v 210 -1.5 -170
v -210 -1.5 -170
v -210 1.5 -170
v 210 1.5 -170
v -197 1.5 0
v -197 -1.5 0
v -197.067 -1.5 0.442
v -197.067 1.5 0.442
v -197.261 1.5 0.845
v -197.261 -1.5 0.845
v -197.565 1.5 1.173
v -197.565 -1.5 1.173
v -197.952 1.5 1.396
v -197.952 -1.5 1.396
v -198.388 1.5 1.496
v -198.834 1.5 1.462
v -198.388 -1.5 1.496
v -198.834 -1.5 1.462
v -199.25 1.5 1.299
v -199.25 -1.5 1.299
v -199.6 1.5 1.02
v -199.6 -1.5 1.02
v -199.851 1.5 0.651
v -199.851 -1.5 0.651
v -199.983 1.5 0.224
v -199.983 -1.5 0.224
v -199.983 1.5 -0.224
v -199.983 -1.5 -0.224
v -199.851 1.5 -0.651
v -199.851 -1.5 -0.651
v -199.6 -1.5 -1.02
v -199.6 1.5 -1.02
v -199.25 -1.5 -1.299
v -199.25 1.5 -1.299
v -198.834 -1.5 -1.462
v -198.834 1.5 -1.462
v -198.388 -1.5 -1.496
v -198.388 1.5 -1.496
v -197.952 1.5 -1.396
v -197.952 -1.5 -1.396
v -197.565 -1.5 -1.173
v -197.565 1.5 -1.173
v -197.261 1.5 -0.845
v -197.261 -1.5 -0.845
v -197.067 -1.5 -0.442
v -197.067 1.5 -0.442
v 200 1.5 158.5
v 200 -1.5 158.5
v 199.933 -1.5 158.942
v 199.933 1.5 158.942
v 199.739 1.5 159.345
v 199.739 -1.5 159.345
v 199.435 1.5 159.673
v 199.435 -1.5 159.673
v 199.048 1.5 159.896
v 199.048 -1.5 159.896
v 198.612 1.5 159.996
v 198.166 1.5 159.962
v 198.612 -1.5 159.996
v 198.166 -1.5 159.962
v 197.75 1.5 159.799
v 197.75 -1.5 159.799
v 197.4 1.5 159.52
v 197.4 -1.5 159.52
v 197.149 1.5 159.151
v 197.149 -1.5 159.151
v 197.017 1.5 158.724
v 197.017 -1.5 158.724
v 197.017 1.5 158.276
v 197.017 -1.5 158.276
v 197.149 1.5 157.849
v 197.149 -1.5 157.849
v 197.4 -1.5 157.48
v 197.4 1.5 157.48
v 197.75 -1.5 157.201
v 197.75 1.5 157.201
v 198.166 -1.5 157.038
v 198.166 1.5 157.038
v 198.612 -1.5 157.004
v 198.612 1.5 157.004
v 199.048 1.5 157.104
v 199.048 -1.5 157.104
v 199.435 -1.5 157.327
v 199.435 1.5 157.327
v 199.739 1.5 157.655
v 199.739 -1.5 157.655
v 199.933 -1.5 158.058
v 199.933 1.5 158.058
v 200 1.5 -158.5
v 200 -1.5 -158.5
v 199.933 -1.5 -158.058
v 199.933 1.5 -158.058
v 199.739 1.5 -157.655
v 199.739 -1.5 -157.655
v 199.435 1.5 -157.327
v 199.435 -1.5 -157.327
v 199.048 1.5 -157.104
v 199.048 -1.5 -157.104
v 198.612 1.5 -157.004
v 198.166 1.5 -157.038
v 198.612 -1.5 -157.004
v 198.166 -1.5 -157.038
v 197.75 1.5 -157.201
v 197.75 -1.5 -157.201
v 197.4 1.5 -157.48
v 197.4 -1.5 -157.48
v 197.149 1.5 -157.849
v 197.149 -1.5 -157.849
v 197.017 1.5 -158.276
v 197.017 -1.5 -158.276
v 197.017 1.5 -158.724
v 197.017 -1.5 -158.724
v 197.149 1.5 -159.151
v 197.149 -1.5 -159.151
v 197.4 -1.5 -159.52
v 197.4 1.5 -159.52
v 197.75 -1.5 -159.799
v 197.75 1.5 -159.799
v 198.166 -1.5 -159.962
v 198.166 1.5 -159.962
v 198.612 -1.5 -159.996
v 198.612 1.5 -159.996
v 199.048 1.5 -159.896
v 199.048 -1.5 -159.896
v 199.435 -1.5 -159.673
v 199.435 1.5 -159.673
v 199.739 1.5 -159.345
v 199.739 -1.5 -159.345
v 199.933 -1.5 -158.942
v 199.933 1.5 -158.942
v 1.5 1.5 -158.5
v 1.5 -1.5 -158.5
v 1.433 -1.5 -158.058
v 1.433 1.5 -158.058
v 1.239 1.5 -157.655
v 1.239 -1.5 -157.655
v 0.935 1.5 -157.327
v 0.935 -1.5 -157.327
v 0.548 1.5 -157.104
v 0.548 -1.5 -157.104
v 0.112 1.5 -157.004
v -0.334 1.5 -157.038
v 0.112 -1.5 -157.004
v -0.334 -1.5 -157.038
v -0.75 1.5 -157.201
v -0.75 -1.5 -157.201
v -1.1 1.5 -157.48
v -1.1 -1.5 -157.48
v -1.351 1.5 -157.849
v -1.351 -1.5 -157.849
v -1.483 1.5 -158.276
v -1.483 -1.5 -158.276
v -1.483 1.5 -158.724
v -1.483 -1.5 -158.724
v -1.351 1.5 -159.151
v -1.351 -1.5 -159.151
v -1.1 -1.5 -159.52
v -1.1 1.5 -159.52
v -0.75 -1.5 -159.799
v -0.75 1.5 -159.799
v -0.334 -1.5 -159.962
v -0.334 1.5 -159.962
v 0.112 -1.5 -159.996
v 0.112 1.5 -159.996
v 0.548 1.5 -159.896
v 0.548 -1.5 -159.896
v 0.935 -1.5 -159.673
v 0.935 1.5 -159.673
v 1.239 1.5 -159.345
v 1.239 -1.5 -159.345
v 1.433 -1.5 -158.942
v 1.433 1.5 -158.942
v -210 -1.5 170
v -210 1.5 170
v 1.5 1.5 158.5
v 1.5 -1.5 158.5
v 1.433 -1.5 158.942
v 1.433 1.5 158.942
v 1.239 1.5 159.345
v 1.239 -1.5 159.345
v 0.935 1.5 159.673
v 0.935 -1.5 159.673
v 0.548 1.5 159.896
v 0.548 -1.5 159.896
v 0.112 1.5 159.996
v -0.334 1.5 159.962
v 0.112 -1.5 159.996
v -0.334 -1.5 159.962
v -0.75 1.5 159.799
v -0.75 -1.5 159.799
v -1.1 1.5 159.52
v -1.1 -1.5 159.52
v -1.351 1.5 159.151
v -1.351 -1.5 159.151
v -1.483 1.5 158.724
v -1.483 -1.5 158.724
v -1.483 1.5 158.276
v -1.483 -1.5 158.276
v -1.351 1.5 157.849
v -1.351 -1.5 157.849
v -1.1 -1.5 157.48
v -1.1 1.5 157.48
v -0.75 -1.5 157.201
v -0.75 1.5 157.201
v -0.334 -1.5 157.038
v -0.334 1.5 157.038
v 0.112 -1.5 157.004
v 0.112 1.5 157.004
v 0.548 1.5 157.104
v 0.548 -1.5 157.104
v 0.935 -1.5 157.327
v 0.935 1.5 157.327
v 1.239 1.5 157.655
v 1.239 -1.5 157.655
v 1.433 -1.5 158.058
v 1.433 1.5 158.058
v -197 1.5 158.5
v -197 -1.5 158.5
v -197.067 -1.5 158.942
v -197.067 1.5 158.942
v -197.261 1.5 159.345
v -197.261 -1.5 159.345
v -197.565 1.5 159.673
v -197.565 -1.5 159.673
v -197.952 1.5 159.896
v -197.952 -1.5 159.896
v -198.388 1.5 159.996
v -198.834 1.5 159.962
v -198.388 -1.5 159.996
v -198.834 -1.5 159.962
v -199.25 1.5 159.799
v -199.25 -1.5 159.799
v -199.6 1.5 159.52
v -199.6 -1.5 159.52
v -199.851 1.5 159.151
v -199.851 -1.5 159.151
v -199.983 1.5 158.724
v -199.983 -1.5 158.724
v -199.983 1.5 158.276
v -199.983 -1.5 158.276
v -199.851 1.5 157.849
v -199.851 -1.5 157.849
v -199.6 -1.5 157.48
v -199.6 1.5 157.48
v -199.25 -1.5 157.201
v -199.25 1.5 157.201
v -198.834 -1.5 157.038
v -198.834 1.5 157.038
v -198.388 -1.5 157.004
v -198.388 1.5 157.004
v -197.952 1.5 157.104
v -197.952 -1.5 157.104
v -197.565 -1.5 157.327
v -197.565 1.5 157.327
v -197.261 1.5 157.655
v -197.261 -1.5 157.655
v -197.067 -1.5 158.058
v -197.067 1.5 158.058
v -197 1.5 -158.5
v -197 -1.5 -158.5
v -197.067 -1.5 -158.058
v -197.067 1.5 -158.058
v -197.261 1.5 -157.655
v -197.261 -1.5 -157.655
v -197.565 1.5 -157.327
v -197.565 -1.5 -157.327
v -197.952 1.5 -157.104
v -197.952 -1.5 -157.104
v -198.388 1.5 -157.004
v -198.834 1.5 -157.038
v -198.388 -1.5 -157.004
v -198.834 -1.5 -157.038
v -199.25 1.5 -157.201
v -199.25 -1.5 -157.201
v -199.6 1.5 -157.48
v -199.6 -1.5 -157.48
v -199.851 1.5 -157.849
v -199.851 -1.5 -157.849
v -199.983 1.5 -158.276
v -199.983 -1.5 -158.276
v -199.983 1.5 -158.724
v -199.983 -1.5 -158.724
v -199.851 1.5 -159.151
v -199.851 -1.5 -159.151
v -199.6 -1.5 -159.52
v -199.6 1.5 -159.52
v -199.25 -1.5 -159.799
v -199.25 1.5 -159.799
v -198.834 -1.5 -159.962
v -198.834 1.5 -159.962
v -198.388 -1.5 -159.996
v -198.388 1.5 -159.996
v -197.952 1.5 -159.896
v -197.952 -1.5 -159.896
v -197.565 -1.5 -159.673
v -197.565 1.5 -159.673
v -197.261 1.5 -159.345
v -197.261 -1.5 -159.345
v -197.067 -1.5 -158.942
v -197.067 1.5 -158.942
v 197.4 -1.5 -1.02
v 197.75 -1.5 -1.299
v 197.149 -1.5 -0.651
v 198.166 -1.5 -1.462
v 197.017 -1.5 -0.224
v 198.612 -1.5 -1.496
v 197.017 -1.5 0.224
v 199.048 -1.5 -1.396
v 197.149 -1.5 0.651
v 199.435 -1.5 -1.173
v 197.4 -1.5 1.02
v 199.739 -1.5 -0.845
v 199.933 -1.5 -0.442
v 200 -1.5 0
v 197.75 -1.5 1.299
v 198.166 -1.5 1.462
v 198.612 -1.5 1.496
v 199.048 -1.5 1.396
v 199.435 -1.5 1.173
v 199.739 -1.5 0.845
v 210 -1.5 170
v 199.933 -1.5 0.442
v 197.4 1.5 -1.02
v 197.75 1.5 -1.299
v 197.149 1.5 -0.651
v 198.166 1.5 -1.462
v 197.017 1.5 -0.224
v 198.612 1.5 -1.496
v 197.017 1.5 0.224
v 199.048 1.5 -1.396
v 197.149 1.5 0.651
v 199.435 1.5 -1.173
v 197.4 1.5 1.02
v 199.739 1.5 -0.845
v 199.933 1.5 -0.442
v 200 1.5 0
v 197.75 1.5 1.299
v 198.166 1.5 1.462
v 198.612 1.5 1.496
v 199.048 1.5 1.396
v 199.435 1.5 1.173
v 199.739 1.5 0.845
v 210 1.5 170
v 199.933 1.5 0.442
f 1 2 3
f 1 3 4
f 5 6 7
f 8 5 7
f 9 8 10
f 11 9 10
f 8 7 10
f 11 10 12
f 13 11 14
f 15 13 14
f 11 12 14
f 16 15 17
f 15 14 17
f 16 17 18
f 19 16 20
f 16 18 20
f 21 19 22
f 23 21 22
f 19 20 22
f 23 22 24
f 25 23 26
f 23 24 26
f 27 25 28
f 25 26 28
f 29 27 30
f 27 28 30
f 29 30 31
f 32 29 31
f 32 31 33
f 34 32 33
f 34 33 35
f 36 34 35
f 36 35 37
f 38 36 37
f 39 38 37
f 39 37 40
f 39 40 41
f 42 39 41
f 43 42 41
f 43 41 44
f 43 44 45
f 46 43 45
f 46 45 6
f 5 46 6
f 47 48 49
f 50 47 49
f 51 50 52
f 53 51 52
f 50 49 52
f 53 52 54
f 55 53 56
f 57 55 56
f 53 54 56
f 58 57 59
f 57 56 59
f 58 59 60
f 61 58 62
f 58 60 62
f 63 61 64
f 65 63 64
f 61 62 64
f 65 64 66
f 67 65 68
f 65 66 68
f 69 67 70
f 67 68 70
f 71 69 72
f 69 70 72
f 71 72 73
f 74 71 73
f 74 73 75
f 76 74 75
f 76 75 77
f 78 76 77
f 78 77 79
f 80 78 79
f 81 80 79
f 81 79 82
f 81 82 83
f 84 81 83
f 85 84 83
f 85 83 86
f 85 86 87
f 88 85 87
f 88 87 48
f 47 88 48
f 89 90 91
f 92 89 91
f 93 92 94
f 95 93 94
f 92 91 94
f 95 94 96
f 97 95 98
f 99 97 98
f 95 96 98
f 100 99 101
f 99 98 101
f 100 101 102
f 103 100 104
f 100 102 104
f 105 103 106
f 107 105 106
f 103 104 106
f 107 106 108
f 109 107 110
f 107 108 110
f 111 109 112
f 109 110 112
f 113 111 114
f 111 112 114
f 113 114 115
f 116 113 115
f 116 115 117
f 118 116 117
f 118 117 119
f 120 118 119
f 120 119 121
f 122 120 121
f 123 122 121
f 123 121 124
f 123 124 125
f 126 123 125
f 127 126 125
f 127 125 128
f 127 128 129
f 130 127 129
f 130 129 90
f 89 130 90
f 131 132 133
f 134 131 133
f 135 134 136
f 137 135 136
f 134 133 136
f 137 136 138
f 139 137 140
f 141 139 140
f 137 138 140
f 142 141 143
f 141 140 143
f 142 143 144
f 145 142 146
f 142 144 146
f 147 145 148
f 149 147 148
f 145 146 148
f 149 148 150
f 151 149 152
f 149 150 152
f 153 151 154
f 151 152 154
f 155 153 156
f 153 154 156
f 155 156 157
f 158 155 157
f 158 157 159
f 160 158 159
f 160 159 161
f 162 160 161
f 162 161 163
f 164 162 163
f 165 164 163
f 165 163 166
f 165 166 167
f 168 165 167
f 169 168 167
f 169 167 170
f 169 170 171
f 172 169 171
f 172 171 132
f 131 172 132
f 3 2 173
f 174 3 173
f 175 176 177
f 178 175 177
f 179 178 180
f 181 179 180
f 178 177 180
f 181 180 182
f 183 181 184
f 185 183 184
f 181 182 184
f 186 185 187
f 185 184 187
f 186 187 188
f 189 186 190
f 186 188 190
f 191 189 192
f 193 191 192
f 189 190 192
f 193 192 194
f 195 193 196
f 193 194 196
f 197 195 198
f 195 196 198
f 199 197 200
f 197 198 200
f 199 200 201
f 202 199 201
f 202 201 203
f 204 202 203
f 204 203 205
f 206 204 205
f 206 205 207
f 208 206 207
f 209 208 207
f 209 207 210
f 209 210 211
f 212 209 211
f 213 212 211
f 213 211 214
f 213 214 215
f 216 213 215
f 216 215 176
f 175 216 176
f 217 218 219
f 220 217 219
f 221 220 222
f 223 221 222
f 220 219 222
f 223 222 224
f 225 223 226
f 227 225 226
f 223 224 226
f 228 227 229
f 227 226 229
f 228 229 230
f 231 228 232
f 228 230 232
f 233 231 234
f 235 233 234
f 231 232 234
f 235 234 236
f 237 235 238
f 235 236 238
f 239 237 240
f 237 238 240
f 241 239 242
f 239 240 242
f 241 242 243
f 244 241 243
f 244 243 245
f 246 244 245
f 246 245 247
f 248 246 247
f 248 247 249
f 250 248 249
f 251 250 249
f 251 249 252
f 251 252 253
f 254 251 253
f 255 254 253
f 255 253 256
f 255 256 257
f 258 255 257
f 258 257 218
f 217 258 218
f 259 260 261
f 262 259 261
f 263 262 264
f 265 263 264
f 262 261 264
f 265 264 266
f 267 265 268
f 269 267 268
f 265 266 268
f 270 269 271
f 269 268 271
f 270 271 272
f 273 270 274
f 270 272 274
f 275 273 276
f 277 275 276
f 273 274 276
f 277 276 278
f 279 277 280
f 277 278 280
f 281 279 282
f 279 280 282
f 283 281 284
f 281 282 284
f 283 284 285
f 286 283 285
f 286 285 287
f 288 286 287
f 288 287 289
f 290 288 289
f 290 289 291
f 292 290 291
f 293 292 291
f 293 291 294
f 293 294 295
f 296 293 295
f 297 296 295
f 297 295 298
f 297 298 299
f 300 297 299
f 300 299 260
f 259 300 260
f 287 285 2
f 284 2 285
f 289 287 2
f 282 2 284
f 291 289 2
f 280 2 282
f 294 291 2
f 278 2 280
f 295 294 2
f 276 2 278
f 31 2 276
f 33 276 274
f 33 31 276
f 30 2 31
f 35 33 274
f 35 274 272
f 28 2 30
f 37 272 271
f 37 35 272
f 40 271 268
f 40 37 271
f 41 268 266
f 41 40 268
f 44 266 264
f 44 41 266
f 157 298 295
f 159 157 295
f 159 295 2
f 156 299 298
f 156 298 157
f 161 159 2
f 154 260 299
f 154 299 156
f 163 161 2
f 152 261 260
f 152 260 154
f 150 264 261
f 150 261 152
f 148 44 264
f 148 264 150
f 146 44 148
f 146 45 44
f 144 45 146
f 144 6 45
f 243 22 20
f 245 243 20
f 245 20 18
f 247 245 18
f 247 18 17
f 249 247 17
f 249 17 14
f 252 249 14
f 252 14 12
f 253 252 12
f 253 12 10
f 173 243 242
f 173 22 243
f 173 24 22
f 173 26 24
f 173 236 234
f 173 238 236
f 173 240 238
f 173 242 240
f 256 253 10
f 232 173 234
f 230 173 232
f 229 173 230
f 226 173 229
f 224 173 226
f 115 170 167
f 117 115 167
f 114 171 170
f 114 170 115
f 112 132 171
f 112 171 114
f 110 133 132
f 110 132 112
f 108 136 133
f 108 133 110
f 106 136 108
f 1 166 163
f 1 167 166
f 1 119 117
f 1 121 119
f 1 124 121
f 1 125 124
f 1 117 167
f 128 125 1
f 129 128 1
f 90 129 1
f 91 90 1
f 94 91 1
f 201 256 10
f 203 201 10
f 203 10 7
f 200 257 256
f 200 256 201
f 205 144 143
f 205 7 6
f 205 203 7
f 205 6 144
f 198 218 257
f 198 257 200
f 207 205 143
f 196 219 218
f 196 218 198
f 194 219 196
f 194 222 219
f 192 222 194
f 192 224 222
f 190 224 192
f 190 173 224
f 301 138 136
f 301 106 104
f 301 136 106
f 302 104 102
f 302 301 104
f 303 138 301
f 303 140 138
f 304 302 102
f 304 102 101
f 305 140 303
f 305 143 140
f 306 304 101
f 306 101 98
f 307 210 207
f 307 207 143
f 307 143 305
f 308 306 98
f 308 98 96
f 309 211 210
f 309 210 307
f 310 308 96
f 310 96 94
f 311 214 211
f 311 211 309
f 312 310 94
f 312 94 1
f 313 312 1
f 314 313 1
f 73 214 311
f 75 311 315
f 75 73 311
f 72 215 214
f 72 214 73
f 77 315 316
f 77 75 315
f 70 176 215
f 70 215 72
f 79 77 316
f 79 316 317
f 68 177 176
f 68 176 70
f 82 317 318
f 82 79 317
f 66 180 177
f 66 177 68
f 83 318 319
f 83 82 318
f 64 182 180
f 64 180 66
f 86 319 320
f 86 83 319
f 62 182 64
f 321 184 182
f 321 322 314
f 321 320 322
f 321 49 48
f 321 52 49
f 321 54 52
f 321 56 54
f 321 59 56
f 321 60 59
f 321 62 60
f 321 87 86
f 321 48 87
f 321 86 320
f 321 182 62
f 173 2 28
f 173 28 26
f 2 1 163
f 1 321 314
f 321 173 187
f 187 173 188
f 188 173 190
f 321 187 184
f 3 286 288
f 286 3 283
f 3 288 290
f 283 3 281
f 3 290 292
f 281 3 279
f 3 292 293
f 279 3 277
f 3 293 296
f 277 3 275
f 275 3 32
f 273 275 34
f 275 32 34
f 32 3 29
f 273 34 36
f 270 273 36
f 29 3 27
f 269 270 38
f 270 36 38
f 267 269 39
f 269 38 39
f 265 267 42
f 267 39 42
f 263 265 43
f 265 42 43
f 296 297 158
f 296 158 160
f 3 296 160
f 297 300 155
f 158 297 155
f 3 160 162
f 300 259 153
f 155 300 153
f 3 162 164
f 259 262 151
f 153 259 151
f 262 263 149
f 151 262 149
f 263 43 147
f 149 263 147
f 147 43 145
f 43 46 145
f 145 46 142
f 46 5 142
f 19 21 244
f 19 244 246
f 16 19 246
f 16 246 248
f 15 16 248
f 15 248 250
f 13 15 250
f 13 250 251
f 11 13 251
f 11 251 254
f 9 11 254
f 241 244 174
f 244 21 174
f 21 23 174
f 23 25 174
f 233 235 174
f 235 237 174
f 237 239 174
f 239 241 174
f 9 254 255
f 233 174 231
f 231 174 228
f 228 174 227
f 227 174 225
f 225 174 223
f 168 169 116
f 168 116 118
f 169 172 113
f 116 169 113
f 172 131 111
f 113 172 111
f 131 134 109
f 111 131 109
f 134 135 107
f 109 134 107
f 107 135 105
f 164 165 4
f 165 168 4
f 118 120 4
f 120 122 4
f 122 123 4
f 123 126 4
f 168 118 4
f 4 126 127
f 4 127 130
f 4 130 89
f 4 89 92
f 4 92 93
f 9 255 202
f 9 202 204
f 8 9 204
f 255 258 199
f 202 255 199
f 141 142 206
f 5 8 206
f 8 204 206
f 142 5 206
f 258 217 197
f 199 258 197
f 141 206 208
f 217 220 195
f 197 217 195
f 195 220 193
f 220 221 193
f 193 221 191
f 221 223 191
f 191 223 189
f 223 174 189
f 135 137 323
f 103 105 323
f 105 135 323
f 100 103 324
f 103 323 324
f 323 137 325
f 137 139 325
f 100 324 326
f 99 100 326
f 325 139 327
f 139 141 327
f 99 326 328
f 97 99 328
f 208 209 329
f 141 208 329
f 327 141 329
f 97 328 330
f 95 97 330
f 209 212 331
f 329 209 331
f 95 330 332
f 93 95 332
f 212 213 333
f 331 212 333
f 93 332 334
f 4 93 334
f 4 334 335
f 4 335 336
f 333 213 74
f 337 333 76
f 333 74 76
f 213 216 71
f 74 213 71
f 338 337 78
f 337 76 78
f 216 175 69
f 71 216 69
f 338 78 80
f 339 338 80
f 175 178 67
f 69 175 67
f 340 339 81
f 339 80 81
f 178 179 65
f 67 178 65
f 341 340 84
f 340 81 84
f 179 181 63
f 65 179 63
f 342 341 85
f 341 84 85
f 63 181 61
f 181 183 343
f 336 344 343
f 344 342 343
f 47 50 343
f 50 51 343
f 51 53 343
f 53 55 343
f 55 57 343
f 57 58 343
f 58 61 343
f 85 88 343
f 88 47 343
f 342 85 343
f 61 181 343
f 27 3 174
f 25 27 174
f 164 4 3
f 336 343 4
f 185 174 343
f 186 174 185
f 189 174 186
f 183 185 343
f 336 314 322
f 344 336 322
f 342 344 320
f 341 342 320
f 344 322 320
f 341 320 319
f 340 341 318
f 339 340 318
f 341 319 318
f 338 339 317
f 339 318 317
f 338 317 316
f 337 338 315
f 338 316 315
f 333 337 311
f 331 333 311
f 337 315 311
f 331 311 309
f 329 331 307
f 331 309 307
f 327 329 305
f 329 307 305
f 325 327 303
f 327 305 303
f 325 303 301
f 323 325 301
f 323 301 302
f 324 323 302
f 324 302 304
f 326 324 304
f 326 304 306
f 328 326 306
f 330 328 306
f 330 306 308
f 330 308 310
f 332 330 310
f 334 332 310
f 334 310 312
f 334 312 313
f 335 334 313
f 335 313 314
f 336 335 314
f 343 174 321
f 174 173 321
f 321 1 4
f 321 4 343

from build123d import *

# Parameters (mm, degrees)
F0_W     = 420
F0_H     = 340
F1_DEPTH = 1.5
F2_R     = 1.5
F3_DEPTH = 25


with BuildPart() as f1:
    # F0 (on Front) → F1 (new body, symmetric)
    with BuildSketch(Plane.XZ):
        Rectangle(F0_W, F0_H)
    extrude(amount=F1_DEPTH, both=True)

    # F2 (on face) → F3 (cut)
    with BuildSketch(Plane.XZ.offset(1.5)):
        with Locations((-198.5, 158.5)):
            Circle(F2_R)
        with Locations((198.5, -158.5)):
            Circle(F2_R)
        with Locations((198.5, 158.500001)):
            Circle(F2_R)
        with Locations((0, 158.500001)):
            Circle(F2_R)
        with Locations((198.500007, 0)):
            Circle(F2_R)
        with Locations((-198.500007, -158.5)):
            Circle(F2_R)
        with Locations((-198.500007, 0)):
            Circle(F2_R)
        with Locations((0, -158.500001)):
            Circle(F2_R)
    extrude(amount=-F3_DEPTH, mode=Mode.SUBTRACT)


solid = f1.part
